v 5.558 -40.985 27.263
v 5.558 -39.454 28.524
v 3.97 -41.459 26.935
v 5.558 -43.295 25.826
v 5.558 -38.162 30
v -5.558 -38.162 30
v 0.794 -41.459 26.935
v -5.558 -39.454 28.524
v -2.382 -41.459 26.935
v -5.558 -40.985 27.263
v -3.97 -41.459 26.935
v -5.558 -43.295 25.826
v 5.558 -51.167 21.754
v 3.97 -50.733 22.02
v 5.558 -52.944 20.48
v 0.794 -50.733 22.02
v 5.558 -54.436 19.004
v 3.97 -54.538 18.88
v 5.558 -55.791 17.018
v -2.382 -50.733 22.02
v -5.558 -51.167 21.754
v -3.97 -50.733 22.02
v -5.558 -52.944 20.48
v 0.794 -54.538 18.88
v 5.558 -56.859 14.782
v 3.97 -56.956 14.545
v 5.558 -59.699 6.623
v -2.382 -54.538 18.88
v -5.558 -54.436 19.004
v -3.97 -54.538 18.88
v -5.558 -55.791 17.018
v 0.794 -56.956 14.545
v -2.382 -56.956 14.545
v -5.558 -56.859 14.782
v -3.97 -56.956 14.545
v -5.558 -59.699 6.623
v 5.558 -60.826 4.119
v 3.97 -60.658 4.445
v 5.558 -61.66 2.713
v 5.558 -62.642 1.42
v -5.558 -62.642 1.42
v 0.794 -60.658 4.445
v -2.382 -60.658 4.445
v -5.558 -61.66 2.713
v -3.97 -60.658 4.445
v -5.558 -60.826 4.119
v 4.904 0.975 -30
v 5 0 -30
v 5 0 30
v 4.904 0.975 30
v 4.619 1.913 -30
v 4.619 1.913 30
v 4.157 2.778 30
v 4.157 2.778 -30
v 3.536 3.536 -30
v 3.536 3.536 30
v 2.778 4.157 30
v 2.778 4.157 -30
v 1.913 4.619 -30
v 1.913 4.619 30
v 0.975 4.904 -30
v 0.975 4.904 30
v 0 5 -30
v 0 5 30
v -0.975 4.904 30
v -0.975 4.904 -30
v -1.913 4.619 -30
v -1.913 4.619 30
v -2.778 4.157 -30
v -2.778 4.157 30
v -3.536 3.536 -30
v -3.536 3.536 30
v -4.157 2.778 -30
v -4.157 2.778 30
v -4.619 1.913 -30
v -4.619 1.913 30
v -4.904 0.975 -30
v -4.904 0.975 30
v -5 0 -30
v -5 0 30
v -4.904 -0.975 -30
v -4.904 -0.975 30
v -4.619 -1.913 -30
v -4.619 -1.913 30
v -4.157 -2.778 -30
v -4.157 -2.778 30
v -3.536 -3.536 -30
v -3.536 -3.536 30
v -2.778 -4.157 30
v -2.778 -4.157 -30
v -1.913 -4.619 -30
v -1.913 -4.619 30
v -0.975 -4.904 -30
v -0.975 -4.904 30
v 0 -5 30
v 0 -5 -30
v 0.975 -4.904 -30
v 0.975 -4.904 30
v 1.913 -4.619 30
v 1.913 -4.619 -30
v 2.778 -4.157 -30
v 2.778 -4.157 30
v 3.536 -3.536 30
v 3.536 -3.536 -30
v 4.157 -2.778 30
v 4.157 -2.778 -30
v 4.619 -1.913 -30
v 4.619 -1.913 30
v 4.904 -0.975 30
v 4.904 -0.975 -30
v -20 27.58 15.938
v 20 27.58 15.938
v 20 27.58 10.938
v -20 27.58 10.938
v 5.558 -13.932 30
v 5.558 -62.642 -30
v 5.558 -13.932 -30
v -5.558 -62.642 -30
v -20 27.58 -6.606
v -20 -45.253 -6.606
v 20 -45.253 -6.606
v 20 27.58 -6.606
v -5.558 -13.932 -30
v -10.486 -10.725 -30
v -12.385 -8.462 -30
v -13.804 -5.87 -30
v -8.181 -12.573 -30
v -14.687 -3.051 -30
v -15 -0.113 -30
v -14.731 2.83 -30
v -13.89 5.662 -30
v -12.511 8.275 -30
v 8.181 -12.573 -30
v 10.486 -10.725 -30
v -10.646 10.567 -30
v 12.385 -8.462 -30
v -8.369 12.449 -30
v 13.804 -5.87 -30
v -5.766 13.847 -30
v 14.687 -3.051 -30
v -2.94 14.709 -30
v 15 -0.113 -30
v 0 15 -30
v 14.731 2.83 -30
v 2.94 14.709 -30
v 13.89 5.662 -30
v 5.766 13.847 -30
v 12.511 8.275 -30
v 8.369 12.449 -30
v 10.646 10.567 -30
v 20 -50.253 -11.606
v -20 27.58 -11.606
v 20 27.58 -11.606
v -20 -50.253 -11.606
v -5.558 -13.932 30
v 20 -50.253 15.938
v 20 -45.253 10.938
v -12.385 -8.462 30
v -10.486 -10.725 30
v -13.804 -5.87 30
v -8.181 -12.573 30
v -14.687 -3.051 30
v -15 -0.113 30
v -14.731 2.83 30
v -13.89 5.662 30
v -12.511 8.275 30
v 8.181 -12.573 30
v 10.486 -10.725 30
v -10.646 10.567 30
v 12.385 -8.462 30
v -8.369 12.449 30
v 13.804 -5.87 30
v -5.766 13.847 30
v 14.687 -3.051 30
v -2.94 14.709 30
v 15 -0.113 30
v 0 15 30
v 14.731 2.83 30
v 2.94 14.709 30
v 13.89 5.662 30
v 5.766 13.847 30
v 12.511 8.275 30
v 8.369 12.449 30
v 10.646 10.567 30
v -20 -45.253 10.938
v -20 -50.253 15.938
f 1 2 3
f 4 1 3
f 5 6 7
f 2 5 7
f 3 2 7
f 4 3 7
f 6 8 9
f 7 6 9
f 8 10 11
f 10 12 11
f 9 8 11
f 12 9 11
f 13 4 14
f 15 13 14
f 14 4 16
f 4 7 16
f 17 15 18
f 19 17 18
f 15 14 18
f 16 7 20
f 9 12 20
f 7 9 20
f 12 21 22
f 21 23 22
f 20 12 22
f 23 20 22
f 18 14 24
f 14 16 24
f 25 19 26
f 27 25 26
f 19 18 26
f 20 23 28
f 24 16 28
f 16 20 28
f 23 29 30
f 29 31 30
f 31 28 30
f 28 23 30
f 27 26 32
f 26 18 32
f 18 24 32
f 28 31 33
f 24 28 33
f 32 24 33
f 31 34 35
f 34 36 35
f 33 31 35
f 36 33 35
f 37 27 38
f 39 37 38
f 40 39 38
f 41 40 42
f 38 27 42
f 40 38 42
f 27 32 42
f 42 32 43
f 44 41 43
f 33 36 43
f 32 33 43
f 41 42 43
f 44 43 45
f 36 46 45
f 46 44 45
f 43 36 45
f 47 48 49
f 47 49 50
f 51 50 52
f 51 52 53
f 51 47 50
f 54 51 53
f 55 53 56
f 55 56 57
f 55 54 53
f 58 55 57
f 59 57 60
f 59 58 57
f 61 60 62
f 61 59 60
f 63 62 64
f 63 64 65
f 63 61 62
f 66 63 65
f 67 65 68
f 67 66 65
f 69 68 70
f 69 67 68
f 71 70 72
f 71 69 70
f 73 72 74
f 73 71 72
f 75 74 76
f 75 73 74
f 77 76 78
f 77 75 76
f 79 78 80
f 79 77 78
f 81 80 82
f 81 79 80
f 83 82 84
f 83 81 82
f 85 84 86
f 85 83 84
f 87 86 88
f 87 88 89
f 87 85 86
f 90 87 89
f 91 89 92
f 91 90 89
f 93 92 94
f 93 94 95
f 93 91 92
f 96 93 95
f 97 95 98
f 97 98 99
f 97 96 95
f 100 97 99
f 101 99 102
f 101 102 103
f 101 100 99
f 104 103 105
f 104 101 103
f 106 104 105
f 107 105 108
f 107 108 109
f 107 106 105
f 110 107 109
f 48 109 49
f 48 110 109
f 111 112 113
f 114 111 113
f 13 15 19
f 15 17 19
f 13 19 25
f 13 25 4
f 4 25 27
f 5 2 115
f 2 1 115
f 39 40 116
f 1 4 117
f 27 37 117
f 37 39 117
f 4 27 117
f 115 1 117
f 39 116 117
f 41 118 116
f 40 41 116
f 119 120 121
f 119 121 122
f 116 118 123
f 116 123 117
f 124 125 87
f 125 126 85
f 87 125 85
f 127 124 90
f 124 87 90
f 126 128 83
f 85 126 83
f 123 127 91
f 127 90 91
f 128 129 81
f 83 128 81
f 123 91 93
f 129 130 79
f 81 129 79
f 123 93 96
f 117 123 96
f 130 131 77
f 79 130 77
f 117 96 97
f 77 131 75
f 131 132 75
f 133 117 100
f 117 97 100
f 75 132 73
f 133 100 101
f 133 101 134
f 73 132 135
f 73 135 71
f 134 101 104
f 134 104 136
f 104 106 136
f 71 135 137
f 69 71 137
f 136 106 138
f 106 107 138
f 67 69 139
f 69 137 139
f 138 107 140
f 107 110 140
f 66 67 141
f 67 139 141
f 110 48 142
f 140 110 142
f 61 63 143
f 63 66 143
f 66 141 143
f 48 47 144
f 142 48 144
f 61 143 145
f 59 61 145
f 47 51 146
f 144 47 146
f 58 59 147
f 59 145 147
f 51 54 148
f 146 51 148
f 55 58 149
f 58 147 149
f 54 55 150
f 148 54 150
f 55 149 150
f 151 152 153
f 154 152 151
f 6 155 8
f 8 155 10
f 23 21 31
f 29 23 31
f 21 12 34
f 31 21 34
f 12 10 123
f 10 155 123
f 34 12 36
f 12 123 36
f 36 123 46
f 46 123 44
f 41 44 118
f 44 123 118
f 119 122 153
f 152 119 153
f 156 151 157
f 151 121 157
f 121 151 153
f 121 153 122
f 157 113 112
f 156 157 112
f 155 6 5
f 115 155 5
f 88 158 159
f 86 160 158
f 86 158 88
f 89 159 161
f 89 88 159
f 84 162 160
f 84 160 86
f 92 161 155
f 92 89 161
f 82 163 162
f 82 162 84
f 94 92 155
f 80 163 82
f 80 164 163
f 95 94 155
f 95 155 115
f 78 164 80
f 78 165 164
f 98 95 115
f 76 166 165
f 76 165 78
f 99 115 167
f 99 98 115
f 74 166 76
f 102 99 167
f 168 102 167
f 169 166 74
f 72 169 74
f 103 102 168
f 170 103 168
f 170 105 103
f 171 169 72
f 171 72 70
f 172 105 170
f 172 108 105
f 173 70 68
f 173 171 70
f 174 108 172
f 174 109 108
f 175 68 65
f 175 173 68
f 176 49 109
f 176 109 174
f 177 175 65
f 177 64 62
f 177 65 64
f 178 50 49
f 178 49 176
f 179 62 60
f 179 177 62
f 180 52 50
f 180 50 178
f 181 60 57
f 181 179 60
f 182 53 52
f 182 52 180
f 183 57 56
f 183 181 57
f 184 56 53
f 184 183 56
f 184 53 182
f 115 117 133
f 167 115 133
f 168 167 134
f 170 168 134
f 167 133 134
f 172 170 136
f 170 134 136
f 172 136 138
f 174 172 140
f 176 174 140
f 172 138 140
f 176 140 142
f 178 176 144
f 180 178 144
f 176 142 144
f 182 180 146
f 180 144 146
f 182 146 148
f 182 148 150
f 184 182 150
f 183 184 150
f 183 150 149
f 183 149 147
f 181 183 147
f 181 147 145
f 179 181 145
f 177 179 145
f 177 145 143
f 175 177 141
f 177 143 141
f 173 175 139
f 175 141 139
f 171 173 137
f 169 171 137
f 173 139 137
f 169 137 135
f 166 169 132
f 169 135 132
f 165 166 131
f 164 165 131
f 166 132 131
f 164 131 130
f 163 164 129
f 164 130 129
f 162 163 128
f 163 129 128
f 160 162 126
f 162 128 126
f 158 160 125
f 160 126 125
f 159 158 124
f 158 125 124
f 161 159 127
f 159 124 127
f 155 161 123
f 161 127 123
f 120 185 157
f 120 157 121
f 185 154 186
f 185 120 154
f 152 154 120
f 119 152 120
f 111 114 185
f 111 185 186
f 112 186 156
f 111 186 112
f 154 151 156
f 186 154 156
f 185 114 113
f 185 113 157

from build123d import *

# Parameters (mm, degrees)
EXTRUDE_5_DEPTH      = 30
EXTRUDE_5_DEPTH_BACK = 30
F_1_FR_R             = 5
EXTRUDE_6_DEPTH      = 20
EXTRUDE_6_DEPTH_BACK = 20
OTHER_START          = -5.557606452
OTHER_2_DEPTH        = 11.115212904


# Read off the part's stored shape, not the designer's step: Отступ2
with BuildPart() as part:
    # Эскиз1_fr → Бобышка-Вытянуть5 (new, two sides: drawn at the far end of the back side and taken through both)
    with BuildSketch(Plane.XY.offset(-EXTRUDE_5_DEPTH_BACK)):
        with BuildLine():
            Line((-5.557606452, -13.932444528), (-5.557606452, -62.642280008))
            Line((-5.557606452, -62.642280008), (5.557606452, -62.642280008))
            Line((5.557606452, -62.642280008), (5.557606452, -13.932444528))
            ThreePointArc((5.557606452, -13.932444528), (0, 15), (-5.557606452, -13.932444528))
        make_face()
        Circle(F_1_FR_R, mode=Mode.SUBTRACT)
    extrude(amount=EXTRUDE_5_DEPTH + EXTRUDE_5_DEPTH_BACK)

    # Отступ2 outline → Отступ2 (cut)
    with BuildSketch(Plane.YZ.offset(OTHER_START)):
        with BuildLine():
            add(Edge.make_bspline(
                [(-38.162129208, 30.000000201), (-38.350412386, 29.738589195), (-38.547242858, 29.484853366), (-38.752299072, 29.238505312), (-38.965259498, 28.99925828), (-39.185802485, 28.766826159), (-39.413606123, 28.540923423), (-39.64834813, 28.32126501), (-39.889705768, 28.107566173), (-40.137355811, 27.899542297), (-40.39097457, 27.696908743), (-40.650238001, 27.499380765), (-40.914821881, 27.306673579), (-41.184402075, 27.11850268), (-42.265778691, 26.393314992), (-43.113368902, 25.888872388), (-43.99315142, 25.414009108), (-44.896841535, 24.96146191), (-45.816149017, 24.523958449), (-46.742782565, 24.094220219), (-47.668453227, 23.664962906), (-48.584876381, 23.228895124), (-49.483771918, 22.778716473), (-50.356862203, 22.30711592), (-51.195867455, 21.806771428), (-51.992498133, 21.270351842), (-52.73844395, 20.690521946), (-53.511223517, 19.981130426), (-53.596170911, 19.901516083), (-53.680123568, 19.821092243), (-53.763413941, 19.739889031), (-53.844744398, 19.657606996), (-53.927459143, 19.575304006), (-54.004978314, 19.490233908), (-54.086963112, 19.407352212), (-54.162711198, 19.320126258), (-54.240798044, 19.234583034), (-54.316342943, 19.146873901), (-54.391361142, 19.058753339), (-54.465300564, 18.969694587), (-54.611255963, 18.789935065), (-54.683262919, 18.699224485), (-54.754314107, 18.607695324), (-54.824424506, 18.515359819), (-54.893609092, 18.422230207), (-54.961882842, 18.328318725), (-55.029260732, 18.233637612), (-55.095757741, 18.138199104), (-55.161388843, 18.042015438), (-55.226169019, 17.945098853), (-55.290113242, 17.847461585), (-55.353236491, 17.749115872), (-55.415553743, 17.650073952), (-55.600132437, 17.350896278), (-55.720020886, 17.148708437), (-55.836865309, 16.943882089), (-55.950785669, 16.736514739), (-56.061901911, 16.526703843), (-56.170333957, 16.31454681), (-56.276201707, 16.100141), (-56.379625042, 15.883583727), (-56.480723817, 15.664972254), (-56.579617872, 15.444403799), (-56.676427019, 15.221975529), (-56.771271052, 14.997784566), (-56.864269745, 14.771927983), (-57.138089051, 14.089652446), (-57.313732951, 13.628528404), (-57.48343208, 13.161907014), (-57.648143574, 12.690564713), (-57.808824172, 12.215278032), (-57.966430218, 11.736823601), (-58.121917654, 11.255978148), (-58.276242029, 10.773518498), (-58.430358494, 10.290221572), (-58.585221804, 9.806864391), (-58.741786314, 9.324224071), (-58.901005985, 8.843077827), (-59.063834379, 8.364202972), (-59.410471901, 7.378846098), (-59.594949774, 6.872811052), (-59.785830162, 6.371227061), (-59.984282319, 5.875048562), (-60.19147505, 5.385229705), (-60.408577178, 4.902724584), (-60.636757277, 4.428487146), (-60.877183329, 3.963470844), (-61.131022629, 3.508628159), (-61.399442059, 3.064910118), (-61.683608675, 2.633265954), (-61.984690452, 2.214643016), (-62.303856996, 1.809986968), (-62.642280061, 1.420242276)],
                knots=[0.165052435, 0.165052435, 0.165052435, 0.165052435, 0.165052435, 0.165052435, 0.165052435, 0.165052435, 0.165052435, 0.165052435, 0.165052435, 0.165052435, 0.165052435, 0.165052435, 0.165052435, 0.25, 0.25, 0.25, 0.25, 0.25, 0.25, 0.25, 0.25, 0.25, 0.25, 0.25, 0.25, 0.25, 0.5, 0.5, 0.5, 0.5, 0.5, 0.5, 0.5, 0.5, 0.5, 0.5, 0.5, 0.5, 0.5, 0.53125, 0.53125, 0.53125, 0.53125, 0.53125, 0.53125, 0.53125, 0.53125, 0.53125, 0.53125, 0.53125, 0.53125, 0.53125, 0.5625, 0.5625, 0.5625, 0.5625, 0.5625, 0.5625, 0.5625, 0.5625, 0.5625, 0.5625, 0.5625, 0.5625, 0.5625, 0.625, 0.625, 0.625, 0.625, 0.625, 0.625, 0.625, 0.625, 0.625, 0.625, 0.625, 0.625, 0.625, 0.75, 0.75, 0.75, 0.75, 0.75, 0.75, 0.75, 0.75, 0.75, 0.75, 0.75, 0.75, 0.75, 0.883854275, 0.883854275, 0.883854275, 0.883854275, 0.883854275, 0.883854275, 0.883854275, 0.883854275, 0.883854275, 0.883854275, 0.883854275, 0.883854275, 0.883854275, 0.883854275, 0.883854275], degree=14))
            Line((-38.162129208, 30.000000201), (-62.642280008, 30))
            Line((-62.642280008, 30), (-62.642280061, 1.420242276))
        make_face()
    extrude(amount=OTHER_2_DEPTH, mode=Mode.SUBTRACT)


with BuildPart() as body_2:
    # Эскиз3 → Бобышка-Вытянуть6 (new, two sides: drawn at the far end of the back side and taken through both)
    with BuildSketch(Plane(origin=(0, 0, 0), x_dir=(0, 0, -1), z_dir=(1, 0, 0)).offset(-EXTRUDE_6_DEPTH_BACK)):
        Polygon((-58.394498043, -50.25314581), (-85.938130262, -50.25314581), (-85.938130262, 27.580465306), (-80.938130262, 27.580465306), (-80.938130262, -45.25314581), (-63.394498043, -45.25314581), (-63.394498043, 27.580465306), (-58.394498043, 27.580465306), align=None)
    extrude(amount=EXTRUDE_6_DEPTH + EXTRUDE_6_DEPTH_BACK)


with BuildPart() as body_2_1:
    # Move Body 1: moved
    add(body_2.part.moved(Location((0, 0, -70))))


solid = Compound([part.part, body_2_1.part])
